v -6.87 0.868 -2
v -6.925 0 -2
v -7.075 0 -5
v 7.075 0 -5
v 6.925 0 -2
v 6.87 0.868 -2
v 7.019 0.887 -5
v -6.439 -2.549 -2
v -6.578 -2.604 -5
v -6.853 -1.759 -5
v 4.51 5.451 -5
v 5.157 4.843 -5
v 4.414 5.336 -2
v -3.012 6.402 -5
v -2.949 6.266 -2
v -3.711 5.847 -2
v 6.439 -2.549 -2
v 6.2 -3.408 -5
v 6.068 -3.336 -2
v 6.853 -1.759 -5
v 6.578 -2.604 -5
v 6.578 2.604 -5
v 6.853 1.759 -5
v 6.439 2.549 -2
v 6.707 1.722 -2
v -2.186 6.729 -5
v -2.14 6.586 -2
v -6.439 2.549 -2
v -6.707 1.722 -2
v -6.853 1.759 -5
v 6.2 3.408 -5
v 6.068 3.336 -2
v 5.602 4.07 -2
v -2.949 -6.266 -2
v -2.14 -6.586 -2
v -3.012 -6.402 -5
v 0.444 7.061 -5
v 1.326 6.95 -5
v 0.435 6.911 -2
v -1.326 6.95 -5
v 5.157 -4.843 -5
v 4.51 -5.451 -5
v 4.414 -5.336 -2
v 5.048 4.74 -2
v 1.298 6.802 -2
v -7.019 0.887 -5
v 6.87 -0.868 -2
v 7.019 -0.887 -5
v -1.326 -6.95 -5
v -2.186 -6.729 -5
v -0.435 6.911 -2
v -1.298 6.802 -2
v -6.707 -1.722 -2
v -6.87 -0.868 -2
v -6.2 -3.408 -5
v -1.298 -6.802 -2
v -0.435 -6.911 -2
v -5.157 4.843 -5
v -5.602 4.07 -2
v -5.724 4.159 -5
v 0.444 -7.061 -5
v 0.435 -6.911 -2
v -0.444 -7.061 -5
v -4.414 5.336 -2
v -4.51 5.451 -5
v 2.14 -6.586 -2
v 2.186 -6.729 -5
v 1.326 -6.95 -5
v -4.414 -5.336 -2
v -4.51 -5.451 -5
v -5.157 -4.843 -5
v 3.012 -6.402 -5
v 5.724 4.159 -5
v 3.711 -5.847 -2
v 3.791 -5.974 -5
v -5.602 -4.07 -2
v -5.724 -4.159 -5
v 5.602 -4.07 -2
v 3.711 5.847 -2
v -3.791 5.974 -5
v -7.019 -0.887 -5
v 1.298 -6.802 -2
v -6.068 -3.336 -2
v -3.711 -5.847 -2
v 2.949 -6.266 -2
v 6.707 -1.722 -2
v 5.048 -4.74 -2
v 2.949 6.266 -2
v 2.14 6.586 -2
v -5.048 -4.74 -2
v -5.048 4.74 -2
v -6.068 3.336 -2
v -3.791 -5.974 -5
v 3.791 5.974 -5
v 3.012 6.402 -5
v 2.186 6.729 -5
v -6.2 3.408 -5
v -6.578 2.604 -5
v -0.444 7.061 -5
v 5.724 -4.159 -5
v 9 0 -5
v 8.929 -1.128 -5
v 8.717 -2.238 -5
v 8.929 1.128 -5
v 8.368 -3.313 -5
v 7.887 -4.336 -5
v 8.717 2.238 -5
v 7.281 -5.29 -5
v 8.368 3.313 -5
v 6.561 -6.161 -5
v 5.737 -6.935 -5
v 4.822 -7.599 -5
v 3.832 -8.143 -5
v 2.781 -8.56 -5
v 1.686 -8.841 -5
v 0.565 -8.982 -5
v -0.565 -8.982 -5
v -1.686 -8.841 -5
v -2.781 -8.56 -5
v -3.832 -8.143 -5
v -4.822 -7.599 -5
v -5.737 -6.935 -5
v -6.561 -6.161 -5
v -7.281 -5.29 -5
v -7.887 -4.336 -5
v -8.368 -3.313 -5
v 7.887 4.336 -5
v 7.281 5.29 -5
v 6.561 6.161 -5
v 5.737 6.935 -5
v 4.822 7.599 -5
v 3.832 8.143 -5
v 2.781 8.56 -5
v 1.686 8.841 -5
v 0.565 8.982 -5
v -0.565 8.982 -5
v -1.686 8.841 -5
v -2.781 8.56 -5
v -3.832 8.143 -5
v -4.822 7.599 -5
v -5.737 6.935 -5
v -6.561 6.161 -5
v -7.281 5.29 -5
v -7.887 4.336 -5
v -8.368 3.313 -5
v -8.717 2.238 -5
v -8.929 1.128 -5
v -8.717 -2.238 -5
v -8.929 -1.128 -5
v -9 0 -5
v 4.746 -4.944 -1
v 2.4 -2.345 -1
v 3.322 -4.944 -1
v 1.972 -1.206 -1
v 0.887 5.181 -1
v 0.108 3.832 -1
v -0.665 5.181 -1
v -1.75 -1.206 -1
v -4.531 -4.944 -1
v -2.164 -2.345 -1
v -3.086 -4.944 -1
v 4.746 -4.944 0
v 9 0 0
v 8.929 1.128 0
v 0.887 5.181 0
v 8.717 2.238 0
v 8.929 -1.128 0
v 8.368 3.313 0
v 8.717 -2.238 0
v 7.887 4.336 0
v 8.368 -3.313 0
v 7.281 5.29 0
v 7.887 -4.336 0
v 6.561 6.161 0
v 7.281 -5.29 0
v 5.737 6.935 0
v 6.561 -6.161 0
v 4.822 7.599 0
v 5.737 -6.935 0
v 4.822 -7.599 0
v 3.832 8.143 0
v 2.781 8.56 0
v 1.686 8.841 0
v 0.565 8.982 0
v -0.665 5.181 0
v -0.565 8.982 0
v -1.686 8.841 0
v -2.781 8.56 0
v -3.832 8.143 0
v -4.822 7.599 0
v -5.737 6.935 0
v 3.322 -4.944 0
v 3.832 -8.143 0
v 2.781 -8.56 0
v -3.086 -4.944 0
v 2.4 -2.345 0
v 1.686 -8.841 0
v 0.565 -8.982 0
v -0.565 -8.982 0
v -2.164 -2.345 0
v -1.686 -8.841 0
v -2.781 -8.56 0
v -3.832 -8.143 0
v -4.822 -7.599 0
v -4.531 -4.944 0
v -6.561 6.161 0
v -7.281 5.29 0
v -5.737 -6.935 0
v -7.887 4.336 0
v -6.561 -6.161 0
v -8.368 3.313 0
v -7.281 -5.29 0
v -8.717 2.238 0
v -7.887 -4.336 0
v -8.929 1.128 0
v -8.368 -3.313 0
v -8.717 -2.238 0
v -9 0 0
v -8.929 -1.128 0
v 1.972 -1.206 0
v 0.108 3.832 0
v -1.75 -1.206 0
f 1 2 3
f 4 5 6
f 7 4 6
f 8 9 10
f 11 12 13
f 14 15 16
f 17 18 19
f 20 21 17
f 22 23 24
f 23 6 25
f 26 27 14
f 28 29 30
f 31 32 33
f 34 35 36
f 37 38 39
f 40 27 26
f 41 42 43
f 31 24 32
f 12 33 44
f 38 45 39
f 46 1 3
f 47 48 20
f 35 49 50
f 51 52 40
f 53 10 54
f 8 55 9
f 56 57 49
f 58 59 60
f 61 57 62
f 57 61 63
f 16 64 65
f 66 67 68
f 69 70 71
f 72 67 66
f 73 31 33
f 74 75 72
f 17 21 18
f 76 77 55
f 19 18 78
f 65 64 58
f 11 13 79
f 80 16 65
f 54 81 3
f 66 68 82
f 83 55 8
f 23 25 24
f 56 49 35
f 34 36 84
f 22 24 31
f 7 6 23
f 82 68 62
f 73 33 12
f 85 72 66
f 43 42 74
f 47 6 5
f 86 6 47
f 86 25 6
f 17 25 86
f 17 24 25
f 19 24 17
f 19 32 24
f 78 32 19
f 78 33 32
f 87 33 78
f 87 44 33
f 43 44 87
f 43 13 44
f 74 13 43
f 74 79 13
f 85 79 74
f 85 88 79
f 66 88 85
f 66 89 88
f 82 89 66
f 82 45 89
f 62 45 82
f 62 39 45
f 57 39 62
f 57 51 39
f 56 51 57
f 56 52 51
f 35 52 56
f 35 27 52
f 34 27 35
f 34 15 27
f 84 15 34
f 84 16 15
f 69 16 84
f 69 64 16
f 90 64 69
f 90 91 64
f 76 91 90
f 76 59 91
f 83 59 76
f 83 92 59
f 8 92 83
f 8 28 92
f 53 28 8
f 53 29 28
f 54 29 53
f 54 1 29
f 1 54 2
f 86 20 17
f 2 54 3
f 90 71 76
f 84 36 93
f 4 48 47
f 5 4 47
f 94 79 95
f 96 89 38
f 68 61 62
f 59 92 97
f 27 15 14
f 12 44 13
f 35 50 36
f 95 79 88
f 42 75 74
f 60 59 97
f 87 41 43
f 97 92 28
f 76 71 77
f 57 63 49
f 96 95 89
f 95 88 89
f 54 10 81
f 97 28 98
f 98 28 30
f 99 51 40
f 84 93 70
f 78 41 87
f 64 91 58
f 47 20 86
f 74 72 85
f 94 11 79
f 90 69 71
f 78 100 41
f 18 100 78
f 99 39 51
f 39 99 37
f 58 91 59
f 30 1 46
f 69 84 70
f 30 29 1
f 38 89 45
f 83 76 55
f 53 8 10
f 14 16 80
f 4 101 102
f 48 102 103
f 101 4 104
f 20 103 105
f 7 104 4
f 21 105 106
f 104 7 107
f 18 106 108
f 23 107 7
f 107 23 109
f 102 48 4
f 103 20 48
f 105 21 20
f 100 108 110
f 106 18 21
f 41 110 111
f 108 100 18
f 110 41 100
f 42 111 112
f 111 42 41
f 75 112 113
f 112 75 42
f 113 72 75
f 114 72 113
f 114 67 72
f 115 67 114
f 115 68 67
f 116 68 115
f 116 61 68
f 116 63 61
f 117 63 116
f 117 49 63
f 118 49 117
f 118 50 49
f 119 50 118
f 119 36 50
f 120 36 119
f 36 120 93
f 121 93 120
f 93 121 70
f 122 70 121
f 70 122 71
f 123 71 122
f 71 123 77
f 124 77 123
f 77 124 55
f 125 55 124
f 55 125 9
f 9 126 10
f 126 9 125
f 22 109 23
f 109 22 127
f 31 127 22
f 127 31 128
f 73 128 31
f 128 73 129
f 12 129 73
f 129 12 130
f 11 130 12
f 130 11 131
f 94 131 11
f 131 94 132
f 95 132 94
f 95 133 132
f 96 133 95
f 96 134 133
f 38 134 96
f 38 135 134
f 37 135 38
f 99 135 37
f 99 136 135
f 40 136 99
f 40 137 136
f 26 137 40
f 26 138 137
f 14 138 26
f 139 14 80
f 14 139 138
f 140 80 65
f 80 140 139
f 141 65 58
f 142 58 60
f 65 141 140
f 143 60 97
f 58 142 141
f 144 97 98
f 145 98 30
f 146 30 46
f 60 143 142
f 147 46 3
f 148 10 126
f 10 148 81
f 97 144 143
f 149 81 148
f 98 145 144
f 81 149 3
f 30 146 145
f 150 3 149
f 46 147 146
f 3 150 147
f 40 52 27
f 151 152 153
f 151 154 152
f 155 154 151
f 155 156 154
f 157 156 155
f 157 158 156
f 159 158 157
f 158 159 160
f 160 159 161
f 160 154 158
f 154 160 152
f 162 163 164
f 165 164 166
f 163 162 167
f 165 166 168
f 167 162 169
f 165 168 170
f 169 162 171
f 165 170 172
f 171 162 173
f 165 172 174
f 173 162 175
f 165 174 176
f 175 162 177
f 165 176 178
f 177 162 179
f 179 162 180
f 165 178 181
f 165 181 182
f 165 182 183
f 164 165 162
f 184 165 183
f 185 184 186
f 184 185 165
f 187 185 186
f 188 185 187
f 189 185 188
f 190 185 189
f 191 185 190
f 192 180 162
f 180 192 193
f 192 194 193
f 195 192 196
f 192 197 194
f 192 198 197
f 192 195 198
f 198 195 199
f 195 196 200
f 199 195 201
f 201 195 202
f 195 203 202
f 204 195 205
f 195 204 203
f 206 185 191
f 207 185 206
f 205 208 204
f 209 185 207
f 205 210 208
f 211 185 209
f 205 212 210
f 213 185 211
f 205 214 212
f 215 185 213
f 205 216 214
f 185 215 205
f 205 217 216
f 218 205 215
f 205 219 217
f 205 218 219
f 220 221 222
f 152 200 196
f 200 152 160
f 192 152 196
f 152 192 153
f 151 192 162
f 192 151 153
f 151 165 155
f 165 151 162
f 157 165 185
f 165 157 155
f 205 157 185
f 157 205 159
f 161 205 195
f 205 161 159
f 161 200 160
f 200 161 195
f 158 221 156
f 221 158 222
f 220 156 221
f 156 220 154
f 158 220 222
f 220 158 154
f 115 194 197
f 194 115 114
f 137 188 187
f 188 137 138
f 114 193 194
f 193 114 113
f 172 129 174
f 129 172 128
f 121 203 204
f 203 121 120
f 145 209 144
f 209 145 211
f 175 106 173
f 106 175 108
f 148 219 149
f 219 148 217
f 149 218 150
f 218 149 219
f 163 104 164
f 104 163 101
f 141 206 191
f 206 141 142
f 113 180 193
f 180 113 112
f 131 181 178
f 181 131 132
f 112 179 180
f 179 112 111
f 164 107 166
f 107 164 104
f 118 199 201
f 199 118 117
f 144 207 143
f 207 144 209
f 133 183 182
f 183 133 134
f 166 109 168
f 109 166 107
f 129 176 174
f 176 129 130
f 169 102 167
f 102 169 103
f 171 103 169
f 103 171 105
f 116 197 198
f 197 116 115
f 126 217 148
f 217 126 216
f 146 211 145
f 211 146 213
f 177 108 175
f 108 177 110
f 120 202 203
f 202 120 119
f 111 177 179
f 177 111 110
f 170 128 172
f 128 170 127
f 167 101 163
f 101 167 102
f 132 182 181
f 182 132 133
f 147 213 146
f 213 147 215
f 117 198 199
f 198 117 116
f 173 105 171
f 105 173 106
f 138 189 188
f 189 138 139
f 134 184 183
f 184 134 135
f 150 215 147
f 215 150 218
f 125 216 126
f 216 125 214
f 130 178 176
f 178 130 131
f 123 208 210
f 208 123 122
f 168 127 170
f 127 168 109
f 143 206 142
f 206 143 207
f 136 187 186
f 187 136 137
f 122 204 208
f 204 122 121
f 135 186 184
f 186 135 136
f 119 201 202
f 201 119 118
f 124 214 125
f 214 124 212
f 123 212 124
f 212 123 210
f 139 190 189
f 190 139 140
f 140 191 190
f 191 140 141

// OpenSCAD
$fn = 50;

difference() {
	union() {
		translate(v = [0, 0, -5.0]) {
			cylinder(h = 5, r = 9.0);
		}
	}
	union() {
		#translate(v = [0, 0, -5.0]) {
			cylinder(h = 3, r1 = 7.075, r2 = 6.925);
		}
		translate(v = [0, 0, -1]) {
			linear_extrude(height = 1) {
				text(font = "Impact", halign = "center", size = 10, text = "A", valign = "center");
			}
		}
	}
}
